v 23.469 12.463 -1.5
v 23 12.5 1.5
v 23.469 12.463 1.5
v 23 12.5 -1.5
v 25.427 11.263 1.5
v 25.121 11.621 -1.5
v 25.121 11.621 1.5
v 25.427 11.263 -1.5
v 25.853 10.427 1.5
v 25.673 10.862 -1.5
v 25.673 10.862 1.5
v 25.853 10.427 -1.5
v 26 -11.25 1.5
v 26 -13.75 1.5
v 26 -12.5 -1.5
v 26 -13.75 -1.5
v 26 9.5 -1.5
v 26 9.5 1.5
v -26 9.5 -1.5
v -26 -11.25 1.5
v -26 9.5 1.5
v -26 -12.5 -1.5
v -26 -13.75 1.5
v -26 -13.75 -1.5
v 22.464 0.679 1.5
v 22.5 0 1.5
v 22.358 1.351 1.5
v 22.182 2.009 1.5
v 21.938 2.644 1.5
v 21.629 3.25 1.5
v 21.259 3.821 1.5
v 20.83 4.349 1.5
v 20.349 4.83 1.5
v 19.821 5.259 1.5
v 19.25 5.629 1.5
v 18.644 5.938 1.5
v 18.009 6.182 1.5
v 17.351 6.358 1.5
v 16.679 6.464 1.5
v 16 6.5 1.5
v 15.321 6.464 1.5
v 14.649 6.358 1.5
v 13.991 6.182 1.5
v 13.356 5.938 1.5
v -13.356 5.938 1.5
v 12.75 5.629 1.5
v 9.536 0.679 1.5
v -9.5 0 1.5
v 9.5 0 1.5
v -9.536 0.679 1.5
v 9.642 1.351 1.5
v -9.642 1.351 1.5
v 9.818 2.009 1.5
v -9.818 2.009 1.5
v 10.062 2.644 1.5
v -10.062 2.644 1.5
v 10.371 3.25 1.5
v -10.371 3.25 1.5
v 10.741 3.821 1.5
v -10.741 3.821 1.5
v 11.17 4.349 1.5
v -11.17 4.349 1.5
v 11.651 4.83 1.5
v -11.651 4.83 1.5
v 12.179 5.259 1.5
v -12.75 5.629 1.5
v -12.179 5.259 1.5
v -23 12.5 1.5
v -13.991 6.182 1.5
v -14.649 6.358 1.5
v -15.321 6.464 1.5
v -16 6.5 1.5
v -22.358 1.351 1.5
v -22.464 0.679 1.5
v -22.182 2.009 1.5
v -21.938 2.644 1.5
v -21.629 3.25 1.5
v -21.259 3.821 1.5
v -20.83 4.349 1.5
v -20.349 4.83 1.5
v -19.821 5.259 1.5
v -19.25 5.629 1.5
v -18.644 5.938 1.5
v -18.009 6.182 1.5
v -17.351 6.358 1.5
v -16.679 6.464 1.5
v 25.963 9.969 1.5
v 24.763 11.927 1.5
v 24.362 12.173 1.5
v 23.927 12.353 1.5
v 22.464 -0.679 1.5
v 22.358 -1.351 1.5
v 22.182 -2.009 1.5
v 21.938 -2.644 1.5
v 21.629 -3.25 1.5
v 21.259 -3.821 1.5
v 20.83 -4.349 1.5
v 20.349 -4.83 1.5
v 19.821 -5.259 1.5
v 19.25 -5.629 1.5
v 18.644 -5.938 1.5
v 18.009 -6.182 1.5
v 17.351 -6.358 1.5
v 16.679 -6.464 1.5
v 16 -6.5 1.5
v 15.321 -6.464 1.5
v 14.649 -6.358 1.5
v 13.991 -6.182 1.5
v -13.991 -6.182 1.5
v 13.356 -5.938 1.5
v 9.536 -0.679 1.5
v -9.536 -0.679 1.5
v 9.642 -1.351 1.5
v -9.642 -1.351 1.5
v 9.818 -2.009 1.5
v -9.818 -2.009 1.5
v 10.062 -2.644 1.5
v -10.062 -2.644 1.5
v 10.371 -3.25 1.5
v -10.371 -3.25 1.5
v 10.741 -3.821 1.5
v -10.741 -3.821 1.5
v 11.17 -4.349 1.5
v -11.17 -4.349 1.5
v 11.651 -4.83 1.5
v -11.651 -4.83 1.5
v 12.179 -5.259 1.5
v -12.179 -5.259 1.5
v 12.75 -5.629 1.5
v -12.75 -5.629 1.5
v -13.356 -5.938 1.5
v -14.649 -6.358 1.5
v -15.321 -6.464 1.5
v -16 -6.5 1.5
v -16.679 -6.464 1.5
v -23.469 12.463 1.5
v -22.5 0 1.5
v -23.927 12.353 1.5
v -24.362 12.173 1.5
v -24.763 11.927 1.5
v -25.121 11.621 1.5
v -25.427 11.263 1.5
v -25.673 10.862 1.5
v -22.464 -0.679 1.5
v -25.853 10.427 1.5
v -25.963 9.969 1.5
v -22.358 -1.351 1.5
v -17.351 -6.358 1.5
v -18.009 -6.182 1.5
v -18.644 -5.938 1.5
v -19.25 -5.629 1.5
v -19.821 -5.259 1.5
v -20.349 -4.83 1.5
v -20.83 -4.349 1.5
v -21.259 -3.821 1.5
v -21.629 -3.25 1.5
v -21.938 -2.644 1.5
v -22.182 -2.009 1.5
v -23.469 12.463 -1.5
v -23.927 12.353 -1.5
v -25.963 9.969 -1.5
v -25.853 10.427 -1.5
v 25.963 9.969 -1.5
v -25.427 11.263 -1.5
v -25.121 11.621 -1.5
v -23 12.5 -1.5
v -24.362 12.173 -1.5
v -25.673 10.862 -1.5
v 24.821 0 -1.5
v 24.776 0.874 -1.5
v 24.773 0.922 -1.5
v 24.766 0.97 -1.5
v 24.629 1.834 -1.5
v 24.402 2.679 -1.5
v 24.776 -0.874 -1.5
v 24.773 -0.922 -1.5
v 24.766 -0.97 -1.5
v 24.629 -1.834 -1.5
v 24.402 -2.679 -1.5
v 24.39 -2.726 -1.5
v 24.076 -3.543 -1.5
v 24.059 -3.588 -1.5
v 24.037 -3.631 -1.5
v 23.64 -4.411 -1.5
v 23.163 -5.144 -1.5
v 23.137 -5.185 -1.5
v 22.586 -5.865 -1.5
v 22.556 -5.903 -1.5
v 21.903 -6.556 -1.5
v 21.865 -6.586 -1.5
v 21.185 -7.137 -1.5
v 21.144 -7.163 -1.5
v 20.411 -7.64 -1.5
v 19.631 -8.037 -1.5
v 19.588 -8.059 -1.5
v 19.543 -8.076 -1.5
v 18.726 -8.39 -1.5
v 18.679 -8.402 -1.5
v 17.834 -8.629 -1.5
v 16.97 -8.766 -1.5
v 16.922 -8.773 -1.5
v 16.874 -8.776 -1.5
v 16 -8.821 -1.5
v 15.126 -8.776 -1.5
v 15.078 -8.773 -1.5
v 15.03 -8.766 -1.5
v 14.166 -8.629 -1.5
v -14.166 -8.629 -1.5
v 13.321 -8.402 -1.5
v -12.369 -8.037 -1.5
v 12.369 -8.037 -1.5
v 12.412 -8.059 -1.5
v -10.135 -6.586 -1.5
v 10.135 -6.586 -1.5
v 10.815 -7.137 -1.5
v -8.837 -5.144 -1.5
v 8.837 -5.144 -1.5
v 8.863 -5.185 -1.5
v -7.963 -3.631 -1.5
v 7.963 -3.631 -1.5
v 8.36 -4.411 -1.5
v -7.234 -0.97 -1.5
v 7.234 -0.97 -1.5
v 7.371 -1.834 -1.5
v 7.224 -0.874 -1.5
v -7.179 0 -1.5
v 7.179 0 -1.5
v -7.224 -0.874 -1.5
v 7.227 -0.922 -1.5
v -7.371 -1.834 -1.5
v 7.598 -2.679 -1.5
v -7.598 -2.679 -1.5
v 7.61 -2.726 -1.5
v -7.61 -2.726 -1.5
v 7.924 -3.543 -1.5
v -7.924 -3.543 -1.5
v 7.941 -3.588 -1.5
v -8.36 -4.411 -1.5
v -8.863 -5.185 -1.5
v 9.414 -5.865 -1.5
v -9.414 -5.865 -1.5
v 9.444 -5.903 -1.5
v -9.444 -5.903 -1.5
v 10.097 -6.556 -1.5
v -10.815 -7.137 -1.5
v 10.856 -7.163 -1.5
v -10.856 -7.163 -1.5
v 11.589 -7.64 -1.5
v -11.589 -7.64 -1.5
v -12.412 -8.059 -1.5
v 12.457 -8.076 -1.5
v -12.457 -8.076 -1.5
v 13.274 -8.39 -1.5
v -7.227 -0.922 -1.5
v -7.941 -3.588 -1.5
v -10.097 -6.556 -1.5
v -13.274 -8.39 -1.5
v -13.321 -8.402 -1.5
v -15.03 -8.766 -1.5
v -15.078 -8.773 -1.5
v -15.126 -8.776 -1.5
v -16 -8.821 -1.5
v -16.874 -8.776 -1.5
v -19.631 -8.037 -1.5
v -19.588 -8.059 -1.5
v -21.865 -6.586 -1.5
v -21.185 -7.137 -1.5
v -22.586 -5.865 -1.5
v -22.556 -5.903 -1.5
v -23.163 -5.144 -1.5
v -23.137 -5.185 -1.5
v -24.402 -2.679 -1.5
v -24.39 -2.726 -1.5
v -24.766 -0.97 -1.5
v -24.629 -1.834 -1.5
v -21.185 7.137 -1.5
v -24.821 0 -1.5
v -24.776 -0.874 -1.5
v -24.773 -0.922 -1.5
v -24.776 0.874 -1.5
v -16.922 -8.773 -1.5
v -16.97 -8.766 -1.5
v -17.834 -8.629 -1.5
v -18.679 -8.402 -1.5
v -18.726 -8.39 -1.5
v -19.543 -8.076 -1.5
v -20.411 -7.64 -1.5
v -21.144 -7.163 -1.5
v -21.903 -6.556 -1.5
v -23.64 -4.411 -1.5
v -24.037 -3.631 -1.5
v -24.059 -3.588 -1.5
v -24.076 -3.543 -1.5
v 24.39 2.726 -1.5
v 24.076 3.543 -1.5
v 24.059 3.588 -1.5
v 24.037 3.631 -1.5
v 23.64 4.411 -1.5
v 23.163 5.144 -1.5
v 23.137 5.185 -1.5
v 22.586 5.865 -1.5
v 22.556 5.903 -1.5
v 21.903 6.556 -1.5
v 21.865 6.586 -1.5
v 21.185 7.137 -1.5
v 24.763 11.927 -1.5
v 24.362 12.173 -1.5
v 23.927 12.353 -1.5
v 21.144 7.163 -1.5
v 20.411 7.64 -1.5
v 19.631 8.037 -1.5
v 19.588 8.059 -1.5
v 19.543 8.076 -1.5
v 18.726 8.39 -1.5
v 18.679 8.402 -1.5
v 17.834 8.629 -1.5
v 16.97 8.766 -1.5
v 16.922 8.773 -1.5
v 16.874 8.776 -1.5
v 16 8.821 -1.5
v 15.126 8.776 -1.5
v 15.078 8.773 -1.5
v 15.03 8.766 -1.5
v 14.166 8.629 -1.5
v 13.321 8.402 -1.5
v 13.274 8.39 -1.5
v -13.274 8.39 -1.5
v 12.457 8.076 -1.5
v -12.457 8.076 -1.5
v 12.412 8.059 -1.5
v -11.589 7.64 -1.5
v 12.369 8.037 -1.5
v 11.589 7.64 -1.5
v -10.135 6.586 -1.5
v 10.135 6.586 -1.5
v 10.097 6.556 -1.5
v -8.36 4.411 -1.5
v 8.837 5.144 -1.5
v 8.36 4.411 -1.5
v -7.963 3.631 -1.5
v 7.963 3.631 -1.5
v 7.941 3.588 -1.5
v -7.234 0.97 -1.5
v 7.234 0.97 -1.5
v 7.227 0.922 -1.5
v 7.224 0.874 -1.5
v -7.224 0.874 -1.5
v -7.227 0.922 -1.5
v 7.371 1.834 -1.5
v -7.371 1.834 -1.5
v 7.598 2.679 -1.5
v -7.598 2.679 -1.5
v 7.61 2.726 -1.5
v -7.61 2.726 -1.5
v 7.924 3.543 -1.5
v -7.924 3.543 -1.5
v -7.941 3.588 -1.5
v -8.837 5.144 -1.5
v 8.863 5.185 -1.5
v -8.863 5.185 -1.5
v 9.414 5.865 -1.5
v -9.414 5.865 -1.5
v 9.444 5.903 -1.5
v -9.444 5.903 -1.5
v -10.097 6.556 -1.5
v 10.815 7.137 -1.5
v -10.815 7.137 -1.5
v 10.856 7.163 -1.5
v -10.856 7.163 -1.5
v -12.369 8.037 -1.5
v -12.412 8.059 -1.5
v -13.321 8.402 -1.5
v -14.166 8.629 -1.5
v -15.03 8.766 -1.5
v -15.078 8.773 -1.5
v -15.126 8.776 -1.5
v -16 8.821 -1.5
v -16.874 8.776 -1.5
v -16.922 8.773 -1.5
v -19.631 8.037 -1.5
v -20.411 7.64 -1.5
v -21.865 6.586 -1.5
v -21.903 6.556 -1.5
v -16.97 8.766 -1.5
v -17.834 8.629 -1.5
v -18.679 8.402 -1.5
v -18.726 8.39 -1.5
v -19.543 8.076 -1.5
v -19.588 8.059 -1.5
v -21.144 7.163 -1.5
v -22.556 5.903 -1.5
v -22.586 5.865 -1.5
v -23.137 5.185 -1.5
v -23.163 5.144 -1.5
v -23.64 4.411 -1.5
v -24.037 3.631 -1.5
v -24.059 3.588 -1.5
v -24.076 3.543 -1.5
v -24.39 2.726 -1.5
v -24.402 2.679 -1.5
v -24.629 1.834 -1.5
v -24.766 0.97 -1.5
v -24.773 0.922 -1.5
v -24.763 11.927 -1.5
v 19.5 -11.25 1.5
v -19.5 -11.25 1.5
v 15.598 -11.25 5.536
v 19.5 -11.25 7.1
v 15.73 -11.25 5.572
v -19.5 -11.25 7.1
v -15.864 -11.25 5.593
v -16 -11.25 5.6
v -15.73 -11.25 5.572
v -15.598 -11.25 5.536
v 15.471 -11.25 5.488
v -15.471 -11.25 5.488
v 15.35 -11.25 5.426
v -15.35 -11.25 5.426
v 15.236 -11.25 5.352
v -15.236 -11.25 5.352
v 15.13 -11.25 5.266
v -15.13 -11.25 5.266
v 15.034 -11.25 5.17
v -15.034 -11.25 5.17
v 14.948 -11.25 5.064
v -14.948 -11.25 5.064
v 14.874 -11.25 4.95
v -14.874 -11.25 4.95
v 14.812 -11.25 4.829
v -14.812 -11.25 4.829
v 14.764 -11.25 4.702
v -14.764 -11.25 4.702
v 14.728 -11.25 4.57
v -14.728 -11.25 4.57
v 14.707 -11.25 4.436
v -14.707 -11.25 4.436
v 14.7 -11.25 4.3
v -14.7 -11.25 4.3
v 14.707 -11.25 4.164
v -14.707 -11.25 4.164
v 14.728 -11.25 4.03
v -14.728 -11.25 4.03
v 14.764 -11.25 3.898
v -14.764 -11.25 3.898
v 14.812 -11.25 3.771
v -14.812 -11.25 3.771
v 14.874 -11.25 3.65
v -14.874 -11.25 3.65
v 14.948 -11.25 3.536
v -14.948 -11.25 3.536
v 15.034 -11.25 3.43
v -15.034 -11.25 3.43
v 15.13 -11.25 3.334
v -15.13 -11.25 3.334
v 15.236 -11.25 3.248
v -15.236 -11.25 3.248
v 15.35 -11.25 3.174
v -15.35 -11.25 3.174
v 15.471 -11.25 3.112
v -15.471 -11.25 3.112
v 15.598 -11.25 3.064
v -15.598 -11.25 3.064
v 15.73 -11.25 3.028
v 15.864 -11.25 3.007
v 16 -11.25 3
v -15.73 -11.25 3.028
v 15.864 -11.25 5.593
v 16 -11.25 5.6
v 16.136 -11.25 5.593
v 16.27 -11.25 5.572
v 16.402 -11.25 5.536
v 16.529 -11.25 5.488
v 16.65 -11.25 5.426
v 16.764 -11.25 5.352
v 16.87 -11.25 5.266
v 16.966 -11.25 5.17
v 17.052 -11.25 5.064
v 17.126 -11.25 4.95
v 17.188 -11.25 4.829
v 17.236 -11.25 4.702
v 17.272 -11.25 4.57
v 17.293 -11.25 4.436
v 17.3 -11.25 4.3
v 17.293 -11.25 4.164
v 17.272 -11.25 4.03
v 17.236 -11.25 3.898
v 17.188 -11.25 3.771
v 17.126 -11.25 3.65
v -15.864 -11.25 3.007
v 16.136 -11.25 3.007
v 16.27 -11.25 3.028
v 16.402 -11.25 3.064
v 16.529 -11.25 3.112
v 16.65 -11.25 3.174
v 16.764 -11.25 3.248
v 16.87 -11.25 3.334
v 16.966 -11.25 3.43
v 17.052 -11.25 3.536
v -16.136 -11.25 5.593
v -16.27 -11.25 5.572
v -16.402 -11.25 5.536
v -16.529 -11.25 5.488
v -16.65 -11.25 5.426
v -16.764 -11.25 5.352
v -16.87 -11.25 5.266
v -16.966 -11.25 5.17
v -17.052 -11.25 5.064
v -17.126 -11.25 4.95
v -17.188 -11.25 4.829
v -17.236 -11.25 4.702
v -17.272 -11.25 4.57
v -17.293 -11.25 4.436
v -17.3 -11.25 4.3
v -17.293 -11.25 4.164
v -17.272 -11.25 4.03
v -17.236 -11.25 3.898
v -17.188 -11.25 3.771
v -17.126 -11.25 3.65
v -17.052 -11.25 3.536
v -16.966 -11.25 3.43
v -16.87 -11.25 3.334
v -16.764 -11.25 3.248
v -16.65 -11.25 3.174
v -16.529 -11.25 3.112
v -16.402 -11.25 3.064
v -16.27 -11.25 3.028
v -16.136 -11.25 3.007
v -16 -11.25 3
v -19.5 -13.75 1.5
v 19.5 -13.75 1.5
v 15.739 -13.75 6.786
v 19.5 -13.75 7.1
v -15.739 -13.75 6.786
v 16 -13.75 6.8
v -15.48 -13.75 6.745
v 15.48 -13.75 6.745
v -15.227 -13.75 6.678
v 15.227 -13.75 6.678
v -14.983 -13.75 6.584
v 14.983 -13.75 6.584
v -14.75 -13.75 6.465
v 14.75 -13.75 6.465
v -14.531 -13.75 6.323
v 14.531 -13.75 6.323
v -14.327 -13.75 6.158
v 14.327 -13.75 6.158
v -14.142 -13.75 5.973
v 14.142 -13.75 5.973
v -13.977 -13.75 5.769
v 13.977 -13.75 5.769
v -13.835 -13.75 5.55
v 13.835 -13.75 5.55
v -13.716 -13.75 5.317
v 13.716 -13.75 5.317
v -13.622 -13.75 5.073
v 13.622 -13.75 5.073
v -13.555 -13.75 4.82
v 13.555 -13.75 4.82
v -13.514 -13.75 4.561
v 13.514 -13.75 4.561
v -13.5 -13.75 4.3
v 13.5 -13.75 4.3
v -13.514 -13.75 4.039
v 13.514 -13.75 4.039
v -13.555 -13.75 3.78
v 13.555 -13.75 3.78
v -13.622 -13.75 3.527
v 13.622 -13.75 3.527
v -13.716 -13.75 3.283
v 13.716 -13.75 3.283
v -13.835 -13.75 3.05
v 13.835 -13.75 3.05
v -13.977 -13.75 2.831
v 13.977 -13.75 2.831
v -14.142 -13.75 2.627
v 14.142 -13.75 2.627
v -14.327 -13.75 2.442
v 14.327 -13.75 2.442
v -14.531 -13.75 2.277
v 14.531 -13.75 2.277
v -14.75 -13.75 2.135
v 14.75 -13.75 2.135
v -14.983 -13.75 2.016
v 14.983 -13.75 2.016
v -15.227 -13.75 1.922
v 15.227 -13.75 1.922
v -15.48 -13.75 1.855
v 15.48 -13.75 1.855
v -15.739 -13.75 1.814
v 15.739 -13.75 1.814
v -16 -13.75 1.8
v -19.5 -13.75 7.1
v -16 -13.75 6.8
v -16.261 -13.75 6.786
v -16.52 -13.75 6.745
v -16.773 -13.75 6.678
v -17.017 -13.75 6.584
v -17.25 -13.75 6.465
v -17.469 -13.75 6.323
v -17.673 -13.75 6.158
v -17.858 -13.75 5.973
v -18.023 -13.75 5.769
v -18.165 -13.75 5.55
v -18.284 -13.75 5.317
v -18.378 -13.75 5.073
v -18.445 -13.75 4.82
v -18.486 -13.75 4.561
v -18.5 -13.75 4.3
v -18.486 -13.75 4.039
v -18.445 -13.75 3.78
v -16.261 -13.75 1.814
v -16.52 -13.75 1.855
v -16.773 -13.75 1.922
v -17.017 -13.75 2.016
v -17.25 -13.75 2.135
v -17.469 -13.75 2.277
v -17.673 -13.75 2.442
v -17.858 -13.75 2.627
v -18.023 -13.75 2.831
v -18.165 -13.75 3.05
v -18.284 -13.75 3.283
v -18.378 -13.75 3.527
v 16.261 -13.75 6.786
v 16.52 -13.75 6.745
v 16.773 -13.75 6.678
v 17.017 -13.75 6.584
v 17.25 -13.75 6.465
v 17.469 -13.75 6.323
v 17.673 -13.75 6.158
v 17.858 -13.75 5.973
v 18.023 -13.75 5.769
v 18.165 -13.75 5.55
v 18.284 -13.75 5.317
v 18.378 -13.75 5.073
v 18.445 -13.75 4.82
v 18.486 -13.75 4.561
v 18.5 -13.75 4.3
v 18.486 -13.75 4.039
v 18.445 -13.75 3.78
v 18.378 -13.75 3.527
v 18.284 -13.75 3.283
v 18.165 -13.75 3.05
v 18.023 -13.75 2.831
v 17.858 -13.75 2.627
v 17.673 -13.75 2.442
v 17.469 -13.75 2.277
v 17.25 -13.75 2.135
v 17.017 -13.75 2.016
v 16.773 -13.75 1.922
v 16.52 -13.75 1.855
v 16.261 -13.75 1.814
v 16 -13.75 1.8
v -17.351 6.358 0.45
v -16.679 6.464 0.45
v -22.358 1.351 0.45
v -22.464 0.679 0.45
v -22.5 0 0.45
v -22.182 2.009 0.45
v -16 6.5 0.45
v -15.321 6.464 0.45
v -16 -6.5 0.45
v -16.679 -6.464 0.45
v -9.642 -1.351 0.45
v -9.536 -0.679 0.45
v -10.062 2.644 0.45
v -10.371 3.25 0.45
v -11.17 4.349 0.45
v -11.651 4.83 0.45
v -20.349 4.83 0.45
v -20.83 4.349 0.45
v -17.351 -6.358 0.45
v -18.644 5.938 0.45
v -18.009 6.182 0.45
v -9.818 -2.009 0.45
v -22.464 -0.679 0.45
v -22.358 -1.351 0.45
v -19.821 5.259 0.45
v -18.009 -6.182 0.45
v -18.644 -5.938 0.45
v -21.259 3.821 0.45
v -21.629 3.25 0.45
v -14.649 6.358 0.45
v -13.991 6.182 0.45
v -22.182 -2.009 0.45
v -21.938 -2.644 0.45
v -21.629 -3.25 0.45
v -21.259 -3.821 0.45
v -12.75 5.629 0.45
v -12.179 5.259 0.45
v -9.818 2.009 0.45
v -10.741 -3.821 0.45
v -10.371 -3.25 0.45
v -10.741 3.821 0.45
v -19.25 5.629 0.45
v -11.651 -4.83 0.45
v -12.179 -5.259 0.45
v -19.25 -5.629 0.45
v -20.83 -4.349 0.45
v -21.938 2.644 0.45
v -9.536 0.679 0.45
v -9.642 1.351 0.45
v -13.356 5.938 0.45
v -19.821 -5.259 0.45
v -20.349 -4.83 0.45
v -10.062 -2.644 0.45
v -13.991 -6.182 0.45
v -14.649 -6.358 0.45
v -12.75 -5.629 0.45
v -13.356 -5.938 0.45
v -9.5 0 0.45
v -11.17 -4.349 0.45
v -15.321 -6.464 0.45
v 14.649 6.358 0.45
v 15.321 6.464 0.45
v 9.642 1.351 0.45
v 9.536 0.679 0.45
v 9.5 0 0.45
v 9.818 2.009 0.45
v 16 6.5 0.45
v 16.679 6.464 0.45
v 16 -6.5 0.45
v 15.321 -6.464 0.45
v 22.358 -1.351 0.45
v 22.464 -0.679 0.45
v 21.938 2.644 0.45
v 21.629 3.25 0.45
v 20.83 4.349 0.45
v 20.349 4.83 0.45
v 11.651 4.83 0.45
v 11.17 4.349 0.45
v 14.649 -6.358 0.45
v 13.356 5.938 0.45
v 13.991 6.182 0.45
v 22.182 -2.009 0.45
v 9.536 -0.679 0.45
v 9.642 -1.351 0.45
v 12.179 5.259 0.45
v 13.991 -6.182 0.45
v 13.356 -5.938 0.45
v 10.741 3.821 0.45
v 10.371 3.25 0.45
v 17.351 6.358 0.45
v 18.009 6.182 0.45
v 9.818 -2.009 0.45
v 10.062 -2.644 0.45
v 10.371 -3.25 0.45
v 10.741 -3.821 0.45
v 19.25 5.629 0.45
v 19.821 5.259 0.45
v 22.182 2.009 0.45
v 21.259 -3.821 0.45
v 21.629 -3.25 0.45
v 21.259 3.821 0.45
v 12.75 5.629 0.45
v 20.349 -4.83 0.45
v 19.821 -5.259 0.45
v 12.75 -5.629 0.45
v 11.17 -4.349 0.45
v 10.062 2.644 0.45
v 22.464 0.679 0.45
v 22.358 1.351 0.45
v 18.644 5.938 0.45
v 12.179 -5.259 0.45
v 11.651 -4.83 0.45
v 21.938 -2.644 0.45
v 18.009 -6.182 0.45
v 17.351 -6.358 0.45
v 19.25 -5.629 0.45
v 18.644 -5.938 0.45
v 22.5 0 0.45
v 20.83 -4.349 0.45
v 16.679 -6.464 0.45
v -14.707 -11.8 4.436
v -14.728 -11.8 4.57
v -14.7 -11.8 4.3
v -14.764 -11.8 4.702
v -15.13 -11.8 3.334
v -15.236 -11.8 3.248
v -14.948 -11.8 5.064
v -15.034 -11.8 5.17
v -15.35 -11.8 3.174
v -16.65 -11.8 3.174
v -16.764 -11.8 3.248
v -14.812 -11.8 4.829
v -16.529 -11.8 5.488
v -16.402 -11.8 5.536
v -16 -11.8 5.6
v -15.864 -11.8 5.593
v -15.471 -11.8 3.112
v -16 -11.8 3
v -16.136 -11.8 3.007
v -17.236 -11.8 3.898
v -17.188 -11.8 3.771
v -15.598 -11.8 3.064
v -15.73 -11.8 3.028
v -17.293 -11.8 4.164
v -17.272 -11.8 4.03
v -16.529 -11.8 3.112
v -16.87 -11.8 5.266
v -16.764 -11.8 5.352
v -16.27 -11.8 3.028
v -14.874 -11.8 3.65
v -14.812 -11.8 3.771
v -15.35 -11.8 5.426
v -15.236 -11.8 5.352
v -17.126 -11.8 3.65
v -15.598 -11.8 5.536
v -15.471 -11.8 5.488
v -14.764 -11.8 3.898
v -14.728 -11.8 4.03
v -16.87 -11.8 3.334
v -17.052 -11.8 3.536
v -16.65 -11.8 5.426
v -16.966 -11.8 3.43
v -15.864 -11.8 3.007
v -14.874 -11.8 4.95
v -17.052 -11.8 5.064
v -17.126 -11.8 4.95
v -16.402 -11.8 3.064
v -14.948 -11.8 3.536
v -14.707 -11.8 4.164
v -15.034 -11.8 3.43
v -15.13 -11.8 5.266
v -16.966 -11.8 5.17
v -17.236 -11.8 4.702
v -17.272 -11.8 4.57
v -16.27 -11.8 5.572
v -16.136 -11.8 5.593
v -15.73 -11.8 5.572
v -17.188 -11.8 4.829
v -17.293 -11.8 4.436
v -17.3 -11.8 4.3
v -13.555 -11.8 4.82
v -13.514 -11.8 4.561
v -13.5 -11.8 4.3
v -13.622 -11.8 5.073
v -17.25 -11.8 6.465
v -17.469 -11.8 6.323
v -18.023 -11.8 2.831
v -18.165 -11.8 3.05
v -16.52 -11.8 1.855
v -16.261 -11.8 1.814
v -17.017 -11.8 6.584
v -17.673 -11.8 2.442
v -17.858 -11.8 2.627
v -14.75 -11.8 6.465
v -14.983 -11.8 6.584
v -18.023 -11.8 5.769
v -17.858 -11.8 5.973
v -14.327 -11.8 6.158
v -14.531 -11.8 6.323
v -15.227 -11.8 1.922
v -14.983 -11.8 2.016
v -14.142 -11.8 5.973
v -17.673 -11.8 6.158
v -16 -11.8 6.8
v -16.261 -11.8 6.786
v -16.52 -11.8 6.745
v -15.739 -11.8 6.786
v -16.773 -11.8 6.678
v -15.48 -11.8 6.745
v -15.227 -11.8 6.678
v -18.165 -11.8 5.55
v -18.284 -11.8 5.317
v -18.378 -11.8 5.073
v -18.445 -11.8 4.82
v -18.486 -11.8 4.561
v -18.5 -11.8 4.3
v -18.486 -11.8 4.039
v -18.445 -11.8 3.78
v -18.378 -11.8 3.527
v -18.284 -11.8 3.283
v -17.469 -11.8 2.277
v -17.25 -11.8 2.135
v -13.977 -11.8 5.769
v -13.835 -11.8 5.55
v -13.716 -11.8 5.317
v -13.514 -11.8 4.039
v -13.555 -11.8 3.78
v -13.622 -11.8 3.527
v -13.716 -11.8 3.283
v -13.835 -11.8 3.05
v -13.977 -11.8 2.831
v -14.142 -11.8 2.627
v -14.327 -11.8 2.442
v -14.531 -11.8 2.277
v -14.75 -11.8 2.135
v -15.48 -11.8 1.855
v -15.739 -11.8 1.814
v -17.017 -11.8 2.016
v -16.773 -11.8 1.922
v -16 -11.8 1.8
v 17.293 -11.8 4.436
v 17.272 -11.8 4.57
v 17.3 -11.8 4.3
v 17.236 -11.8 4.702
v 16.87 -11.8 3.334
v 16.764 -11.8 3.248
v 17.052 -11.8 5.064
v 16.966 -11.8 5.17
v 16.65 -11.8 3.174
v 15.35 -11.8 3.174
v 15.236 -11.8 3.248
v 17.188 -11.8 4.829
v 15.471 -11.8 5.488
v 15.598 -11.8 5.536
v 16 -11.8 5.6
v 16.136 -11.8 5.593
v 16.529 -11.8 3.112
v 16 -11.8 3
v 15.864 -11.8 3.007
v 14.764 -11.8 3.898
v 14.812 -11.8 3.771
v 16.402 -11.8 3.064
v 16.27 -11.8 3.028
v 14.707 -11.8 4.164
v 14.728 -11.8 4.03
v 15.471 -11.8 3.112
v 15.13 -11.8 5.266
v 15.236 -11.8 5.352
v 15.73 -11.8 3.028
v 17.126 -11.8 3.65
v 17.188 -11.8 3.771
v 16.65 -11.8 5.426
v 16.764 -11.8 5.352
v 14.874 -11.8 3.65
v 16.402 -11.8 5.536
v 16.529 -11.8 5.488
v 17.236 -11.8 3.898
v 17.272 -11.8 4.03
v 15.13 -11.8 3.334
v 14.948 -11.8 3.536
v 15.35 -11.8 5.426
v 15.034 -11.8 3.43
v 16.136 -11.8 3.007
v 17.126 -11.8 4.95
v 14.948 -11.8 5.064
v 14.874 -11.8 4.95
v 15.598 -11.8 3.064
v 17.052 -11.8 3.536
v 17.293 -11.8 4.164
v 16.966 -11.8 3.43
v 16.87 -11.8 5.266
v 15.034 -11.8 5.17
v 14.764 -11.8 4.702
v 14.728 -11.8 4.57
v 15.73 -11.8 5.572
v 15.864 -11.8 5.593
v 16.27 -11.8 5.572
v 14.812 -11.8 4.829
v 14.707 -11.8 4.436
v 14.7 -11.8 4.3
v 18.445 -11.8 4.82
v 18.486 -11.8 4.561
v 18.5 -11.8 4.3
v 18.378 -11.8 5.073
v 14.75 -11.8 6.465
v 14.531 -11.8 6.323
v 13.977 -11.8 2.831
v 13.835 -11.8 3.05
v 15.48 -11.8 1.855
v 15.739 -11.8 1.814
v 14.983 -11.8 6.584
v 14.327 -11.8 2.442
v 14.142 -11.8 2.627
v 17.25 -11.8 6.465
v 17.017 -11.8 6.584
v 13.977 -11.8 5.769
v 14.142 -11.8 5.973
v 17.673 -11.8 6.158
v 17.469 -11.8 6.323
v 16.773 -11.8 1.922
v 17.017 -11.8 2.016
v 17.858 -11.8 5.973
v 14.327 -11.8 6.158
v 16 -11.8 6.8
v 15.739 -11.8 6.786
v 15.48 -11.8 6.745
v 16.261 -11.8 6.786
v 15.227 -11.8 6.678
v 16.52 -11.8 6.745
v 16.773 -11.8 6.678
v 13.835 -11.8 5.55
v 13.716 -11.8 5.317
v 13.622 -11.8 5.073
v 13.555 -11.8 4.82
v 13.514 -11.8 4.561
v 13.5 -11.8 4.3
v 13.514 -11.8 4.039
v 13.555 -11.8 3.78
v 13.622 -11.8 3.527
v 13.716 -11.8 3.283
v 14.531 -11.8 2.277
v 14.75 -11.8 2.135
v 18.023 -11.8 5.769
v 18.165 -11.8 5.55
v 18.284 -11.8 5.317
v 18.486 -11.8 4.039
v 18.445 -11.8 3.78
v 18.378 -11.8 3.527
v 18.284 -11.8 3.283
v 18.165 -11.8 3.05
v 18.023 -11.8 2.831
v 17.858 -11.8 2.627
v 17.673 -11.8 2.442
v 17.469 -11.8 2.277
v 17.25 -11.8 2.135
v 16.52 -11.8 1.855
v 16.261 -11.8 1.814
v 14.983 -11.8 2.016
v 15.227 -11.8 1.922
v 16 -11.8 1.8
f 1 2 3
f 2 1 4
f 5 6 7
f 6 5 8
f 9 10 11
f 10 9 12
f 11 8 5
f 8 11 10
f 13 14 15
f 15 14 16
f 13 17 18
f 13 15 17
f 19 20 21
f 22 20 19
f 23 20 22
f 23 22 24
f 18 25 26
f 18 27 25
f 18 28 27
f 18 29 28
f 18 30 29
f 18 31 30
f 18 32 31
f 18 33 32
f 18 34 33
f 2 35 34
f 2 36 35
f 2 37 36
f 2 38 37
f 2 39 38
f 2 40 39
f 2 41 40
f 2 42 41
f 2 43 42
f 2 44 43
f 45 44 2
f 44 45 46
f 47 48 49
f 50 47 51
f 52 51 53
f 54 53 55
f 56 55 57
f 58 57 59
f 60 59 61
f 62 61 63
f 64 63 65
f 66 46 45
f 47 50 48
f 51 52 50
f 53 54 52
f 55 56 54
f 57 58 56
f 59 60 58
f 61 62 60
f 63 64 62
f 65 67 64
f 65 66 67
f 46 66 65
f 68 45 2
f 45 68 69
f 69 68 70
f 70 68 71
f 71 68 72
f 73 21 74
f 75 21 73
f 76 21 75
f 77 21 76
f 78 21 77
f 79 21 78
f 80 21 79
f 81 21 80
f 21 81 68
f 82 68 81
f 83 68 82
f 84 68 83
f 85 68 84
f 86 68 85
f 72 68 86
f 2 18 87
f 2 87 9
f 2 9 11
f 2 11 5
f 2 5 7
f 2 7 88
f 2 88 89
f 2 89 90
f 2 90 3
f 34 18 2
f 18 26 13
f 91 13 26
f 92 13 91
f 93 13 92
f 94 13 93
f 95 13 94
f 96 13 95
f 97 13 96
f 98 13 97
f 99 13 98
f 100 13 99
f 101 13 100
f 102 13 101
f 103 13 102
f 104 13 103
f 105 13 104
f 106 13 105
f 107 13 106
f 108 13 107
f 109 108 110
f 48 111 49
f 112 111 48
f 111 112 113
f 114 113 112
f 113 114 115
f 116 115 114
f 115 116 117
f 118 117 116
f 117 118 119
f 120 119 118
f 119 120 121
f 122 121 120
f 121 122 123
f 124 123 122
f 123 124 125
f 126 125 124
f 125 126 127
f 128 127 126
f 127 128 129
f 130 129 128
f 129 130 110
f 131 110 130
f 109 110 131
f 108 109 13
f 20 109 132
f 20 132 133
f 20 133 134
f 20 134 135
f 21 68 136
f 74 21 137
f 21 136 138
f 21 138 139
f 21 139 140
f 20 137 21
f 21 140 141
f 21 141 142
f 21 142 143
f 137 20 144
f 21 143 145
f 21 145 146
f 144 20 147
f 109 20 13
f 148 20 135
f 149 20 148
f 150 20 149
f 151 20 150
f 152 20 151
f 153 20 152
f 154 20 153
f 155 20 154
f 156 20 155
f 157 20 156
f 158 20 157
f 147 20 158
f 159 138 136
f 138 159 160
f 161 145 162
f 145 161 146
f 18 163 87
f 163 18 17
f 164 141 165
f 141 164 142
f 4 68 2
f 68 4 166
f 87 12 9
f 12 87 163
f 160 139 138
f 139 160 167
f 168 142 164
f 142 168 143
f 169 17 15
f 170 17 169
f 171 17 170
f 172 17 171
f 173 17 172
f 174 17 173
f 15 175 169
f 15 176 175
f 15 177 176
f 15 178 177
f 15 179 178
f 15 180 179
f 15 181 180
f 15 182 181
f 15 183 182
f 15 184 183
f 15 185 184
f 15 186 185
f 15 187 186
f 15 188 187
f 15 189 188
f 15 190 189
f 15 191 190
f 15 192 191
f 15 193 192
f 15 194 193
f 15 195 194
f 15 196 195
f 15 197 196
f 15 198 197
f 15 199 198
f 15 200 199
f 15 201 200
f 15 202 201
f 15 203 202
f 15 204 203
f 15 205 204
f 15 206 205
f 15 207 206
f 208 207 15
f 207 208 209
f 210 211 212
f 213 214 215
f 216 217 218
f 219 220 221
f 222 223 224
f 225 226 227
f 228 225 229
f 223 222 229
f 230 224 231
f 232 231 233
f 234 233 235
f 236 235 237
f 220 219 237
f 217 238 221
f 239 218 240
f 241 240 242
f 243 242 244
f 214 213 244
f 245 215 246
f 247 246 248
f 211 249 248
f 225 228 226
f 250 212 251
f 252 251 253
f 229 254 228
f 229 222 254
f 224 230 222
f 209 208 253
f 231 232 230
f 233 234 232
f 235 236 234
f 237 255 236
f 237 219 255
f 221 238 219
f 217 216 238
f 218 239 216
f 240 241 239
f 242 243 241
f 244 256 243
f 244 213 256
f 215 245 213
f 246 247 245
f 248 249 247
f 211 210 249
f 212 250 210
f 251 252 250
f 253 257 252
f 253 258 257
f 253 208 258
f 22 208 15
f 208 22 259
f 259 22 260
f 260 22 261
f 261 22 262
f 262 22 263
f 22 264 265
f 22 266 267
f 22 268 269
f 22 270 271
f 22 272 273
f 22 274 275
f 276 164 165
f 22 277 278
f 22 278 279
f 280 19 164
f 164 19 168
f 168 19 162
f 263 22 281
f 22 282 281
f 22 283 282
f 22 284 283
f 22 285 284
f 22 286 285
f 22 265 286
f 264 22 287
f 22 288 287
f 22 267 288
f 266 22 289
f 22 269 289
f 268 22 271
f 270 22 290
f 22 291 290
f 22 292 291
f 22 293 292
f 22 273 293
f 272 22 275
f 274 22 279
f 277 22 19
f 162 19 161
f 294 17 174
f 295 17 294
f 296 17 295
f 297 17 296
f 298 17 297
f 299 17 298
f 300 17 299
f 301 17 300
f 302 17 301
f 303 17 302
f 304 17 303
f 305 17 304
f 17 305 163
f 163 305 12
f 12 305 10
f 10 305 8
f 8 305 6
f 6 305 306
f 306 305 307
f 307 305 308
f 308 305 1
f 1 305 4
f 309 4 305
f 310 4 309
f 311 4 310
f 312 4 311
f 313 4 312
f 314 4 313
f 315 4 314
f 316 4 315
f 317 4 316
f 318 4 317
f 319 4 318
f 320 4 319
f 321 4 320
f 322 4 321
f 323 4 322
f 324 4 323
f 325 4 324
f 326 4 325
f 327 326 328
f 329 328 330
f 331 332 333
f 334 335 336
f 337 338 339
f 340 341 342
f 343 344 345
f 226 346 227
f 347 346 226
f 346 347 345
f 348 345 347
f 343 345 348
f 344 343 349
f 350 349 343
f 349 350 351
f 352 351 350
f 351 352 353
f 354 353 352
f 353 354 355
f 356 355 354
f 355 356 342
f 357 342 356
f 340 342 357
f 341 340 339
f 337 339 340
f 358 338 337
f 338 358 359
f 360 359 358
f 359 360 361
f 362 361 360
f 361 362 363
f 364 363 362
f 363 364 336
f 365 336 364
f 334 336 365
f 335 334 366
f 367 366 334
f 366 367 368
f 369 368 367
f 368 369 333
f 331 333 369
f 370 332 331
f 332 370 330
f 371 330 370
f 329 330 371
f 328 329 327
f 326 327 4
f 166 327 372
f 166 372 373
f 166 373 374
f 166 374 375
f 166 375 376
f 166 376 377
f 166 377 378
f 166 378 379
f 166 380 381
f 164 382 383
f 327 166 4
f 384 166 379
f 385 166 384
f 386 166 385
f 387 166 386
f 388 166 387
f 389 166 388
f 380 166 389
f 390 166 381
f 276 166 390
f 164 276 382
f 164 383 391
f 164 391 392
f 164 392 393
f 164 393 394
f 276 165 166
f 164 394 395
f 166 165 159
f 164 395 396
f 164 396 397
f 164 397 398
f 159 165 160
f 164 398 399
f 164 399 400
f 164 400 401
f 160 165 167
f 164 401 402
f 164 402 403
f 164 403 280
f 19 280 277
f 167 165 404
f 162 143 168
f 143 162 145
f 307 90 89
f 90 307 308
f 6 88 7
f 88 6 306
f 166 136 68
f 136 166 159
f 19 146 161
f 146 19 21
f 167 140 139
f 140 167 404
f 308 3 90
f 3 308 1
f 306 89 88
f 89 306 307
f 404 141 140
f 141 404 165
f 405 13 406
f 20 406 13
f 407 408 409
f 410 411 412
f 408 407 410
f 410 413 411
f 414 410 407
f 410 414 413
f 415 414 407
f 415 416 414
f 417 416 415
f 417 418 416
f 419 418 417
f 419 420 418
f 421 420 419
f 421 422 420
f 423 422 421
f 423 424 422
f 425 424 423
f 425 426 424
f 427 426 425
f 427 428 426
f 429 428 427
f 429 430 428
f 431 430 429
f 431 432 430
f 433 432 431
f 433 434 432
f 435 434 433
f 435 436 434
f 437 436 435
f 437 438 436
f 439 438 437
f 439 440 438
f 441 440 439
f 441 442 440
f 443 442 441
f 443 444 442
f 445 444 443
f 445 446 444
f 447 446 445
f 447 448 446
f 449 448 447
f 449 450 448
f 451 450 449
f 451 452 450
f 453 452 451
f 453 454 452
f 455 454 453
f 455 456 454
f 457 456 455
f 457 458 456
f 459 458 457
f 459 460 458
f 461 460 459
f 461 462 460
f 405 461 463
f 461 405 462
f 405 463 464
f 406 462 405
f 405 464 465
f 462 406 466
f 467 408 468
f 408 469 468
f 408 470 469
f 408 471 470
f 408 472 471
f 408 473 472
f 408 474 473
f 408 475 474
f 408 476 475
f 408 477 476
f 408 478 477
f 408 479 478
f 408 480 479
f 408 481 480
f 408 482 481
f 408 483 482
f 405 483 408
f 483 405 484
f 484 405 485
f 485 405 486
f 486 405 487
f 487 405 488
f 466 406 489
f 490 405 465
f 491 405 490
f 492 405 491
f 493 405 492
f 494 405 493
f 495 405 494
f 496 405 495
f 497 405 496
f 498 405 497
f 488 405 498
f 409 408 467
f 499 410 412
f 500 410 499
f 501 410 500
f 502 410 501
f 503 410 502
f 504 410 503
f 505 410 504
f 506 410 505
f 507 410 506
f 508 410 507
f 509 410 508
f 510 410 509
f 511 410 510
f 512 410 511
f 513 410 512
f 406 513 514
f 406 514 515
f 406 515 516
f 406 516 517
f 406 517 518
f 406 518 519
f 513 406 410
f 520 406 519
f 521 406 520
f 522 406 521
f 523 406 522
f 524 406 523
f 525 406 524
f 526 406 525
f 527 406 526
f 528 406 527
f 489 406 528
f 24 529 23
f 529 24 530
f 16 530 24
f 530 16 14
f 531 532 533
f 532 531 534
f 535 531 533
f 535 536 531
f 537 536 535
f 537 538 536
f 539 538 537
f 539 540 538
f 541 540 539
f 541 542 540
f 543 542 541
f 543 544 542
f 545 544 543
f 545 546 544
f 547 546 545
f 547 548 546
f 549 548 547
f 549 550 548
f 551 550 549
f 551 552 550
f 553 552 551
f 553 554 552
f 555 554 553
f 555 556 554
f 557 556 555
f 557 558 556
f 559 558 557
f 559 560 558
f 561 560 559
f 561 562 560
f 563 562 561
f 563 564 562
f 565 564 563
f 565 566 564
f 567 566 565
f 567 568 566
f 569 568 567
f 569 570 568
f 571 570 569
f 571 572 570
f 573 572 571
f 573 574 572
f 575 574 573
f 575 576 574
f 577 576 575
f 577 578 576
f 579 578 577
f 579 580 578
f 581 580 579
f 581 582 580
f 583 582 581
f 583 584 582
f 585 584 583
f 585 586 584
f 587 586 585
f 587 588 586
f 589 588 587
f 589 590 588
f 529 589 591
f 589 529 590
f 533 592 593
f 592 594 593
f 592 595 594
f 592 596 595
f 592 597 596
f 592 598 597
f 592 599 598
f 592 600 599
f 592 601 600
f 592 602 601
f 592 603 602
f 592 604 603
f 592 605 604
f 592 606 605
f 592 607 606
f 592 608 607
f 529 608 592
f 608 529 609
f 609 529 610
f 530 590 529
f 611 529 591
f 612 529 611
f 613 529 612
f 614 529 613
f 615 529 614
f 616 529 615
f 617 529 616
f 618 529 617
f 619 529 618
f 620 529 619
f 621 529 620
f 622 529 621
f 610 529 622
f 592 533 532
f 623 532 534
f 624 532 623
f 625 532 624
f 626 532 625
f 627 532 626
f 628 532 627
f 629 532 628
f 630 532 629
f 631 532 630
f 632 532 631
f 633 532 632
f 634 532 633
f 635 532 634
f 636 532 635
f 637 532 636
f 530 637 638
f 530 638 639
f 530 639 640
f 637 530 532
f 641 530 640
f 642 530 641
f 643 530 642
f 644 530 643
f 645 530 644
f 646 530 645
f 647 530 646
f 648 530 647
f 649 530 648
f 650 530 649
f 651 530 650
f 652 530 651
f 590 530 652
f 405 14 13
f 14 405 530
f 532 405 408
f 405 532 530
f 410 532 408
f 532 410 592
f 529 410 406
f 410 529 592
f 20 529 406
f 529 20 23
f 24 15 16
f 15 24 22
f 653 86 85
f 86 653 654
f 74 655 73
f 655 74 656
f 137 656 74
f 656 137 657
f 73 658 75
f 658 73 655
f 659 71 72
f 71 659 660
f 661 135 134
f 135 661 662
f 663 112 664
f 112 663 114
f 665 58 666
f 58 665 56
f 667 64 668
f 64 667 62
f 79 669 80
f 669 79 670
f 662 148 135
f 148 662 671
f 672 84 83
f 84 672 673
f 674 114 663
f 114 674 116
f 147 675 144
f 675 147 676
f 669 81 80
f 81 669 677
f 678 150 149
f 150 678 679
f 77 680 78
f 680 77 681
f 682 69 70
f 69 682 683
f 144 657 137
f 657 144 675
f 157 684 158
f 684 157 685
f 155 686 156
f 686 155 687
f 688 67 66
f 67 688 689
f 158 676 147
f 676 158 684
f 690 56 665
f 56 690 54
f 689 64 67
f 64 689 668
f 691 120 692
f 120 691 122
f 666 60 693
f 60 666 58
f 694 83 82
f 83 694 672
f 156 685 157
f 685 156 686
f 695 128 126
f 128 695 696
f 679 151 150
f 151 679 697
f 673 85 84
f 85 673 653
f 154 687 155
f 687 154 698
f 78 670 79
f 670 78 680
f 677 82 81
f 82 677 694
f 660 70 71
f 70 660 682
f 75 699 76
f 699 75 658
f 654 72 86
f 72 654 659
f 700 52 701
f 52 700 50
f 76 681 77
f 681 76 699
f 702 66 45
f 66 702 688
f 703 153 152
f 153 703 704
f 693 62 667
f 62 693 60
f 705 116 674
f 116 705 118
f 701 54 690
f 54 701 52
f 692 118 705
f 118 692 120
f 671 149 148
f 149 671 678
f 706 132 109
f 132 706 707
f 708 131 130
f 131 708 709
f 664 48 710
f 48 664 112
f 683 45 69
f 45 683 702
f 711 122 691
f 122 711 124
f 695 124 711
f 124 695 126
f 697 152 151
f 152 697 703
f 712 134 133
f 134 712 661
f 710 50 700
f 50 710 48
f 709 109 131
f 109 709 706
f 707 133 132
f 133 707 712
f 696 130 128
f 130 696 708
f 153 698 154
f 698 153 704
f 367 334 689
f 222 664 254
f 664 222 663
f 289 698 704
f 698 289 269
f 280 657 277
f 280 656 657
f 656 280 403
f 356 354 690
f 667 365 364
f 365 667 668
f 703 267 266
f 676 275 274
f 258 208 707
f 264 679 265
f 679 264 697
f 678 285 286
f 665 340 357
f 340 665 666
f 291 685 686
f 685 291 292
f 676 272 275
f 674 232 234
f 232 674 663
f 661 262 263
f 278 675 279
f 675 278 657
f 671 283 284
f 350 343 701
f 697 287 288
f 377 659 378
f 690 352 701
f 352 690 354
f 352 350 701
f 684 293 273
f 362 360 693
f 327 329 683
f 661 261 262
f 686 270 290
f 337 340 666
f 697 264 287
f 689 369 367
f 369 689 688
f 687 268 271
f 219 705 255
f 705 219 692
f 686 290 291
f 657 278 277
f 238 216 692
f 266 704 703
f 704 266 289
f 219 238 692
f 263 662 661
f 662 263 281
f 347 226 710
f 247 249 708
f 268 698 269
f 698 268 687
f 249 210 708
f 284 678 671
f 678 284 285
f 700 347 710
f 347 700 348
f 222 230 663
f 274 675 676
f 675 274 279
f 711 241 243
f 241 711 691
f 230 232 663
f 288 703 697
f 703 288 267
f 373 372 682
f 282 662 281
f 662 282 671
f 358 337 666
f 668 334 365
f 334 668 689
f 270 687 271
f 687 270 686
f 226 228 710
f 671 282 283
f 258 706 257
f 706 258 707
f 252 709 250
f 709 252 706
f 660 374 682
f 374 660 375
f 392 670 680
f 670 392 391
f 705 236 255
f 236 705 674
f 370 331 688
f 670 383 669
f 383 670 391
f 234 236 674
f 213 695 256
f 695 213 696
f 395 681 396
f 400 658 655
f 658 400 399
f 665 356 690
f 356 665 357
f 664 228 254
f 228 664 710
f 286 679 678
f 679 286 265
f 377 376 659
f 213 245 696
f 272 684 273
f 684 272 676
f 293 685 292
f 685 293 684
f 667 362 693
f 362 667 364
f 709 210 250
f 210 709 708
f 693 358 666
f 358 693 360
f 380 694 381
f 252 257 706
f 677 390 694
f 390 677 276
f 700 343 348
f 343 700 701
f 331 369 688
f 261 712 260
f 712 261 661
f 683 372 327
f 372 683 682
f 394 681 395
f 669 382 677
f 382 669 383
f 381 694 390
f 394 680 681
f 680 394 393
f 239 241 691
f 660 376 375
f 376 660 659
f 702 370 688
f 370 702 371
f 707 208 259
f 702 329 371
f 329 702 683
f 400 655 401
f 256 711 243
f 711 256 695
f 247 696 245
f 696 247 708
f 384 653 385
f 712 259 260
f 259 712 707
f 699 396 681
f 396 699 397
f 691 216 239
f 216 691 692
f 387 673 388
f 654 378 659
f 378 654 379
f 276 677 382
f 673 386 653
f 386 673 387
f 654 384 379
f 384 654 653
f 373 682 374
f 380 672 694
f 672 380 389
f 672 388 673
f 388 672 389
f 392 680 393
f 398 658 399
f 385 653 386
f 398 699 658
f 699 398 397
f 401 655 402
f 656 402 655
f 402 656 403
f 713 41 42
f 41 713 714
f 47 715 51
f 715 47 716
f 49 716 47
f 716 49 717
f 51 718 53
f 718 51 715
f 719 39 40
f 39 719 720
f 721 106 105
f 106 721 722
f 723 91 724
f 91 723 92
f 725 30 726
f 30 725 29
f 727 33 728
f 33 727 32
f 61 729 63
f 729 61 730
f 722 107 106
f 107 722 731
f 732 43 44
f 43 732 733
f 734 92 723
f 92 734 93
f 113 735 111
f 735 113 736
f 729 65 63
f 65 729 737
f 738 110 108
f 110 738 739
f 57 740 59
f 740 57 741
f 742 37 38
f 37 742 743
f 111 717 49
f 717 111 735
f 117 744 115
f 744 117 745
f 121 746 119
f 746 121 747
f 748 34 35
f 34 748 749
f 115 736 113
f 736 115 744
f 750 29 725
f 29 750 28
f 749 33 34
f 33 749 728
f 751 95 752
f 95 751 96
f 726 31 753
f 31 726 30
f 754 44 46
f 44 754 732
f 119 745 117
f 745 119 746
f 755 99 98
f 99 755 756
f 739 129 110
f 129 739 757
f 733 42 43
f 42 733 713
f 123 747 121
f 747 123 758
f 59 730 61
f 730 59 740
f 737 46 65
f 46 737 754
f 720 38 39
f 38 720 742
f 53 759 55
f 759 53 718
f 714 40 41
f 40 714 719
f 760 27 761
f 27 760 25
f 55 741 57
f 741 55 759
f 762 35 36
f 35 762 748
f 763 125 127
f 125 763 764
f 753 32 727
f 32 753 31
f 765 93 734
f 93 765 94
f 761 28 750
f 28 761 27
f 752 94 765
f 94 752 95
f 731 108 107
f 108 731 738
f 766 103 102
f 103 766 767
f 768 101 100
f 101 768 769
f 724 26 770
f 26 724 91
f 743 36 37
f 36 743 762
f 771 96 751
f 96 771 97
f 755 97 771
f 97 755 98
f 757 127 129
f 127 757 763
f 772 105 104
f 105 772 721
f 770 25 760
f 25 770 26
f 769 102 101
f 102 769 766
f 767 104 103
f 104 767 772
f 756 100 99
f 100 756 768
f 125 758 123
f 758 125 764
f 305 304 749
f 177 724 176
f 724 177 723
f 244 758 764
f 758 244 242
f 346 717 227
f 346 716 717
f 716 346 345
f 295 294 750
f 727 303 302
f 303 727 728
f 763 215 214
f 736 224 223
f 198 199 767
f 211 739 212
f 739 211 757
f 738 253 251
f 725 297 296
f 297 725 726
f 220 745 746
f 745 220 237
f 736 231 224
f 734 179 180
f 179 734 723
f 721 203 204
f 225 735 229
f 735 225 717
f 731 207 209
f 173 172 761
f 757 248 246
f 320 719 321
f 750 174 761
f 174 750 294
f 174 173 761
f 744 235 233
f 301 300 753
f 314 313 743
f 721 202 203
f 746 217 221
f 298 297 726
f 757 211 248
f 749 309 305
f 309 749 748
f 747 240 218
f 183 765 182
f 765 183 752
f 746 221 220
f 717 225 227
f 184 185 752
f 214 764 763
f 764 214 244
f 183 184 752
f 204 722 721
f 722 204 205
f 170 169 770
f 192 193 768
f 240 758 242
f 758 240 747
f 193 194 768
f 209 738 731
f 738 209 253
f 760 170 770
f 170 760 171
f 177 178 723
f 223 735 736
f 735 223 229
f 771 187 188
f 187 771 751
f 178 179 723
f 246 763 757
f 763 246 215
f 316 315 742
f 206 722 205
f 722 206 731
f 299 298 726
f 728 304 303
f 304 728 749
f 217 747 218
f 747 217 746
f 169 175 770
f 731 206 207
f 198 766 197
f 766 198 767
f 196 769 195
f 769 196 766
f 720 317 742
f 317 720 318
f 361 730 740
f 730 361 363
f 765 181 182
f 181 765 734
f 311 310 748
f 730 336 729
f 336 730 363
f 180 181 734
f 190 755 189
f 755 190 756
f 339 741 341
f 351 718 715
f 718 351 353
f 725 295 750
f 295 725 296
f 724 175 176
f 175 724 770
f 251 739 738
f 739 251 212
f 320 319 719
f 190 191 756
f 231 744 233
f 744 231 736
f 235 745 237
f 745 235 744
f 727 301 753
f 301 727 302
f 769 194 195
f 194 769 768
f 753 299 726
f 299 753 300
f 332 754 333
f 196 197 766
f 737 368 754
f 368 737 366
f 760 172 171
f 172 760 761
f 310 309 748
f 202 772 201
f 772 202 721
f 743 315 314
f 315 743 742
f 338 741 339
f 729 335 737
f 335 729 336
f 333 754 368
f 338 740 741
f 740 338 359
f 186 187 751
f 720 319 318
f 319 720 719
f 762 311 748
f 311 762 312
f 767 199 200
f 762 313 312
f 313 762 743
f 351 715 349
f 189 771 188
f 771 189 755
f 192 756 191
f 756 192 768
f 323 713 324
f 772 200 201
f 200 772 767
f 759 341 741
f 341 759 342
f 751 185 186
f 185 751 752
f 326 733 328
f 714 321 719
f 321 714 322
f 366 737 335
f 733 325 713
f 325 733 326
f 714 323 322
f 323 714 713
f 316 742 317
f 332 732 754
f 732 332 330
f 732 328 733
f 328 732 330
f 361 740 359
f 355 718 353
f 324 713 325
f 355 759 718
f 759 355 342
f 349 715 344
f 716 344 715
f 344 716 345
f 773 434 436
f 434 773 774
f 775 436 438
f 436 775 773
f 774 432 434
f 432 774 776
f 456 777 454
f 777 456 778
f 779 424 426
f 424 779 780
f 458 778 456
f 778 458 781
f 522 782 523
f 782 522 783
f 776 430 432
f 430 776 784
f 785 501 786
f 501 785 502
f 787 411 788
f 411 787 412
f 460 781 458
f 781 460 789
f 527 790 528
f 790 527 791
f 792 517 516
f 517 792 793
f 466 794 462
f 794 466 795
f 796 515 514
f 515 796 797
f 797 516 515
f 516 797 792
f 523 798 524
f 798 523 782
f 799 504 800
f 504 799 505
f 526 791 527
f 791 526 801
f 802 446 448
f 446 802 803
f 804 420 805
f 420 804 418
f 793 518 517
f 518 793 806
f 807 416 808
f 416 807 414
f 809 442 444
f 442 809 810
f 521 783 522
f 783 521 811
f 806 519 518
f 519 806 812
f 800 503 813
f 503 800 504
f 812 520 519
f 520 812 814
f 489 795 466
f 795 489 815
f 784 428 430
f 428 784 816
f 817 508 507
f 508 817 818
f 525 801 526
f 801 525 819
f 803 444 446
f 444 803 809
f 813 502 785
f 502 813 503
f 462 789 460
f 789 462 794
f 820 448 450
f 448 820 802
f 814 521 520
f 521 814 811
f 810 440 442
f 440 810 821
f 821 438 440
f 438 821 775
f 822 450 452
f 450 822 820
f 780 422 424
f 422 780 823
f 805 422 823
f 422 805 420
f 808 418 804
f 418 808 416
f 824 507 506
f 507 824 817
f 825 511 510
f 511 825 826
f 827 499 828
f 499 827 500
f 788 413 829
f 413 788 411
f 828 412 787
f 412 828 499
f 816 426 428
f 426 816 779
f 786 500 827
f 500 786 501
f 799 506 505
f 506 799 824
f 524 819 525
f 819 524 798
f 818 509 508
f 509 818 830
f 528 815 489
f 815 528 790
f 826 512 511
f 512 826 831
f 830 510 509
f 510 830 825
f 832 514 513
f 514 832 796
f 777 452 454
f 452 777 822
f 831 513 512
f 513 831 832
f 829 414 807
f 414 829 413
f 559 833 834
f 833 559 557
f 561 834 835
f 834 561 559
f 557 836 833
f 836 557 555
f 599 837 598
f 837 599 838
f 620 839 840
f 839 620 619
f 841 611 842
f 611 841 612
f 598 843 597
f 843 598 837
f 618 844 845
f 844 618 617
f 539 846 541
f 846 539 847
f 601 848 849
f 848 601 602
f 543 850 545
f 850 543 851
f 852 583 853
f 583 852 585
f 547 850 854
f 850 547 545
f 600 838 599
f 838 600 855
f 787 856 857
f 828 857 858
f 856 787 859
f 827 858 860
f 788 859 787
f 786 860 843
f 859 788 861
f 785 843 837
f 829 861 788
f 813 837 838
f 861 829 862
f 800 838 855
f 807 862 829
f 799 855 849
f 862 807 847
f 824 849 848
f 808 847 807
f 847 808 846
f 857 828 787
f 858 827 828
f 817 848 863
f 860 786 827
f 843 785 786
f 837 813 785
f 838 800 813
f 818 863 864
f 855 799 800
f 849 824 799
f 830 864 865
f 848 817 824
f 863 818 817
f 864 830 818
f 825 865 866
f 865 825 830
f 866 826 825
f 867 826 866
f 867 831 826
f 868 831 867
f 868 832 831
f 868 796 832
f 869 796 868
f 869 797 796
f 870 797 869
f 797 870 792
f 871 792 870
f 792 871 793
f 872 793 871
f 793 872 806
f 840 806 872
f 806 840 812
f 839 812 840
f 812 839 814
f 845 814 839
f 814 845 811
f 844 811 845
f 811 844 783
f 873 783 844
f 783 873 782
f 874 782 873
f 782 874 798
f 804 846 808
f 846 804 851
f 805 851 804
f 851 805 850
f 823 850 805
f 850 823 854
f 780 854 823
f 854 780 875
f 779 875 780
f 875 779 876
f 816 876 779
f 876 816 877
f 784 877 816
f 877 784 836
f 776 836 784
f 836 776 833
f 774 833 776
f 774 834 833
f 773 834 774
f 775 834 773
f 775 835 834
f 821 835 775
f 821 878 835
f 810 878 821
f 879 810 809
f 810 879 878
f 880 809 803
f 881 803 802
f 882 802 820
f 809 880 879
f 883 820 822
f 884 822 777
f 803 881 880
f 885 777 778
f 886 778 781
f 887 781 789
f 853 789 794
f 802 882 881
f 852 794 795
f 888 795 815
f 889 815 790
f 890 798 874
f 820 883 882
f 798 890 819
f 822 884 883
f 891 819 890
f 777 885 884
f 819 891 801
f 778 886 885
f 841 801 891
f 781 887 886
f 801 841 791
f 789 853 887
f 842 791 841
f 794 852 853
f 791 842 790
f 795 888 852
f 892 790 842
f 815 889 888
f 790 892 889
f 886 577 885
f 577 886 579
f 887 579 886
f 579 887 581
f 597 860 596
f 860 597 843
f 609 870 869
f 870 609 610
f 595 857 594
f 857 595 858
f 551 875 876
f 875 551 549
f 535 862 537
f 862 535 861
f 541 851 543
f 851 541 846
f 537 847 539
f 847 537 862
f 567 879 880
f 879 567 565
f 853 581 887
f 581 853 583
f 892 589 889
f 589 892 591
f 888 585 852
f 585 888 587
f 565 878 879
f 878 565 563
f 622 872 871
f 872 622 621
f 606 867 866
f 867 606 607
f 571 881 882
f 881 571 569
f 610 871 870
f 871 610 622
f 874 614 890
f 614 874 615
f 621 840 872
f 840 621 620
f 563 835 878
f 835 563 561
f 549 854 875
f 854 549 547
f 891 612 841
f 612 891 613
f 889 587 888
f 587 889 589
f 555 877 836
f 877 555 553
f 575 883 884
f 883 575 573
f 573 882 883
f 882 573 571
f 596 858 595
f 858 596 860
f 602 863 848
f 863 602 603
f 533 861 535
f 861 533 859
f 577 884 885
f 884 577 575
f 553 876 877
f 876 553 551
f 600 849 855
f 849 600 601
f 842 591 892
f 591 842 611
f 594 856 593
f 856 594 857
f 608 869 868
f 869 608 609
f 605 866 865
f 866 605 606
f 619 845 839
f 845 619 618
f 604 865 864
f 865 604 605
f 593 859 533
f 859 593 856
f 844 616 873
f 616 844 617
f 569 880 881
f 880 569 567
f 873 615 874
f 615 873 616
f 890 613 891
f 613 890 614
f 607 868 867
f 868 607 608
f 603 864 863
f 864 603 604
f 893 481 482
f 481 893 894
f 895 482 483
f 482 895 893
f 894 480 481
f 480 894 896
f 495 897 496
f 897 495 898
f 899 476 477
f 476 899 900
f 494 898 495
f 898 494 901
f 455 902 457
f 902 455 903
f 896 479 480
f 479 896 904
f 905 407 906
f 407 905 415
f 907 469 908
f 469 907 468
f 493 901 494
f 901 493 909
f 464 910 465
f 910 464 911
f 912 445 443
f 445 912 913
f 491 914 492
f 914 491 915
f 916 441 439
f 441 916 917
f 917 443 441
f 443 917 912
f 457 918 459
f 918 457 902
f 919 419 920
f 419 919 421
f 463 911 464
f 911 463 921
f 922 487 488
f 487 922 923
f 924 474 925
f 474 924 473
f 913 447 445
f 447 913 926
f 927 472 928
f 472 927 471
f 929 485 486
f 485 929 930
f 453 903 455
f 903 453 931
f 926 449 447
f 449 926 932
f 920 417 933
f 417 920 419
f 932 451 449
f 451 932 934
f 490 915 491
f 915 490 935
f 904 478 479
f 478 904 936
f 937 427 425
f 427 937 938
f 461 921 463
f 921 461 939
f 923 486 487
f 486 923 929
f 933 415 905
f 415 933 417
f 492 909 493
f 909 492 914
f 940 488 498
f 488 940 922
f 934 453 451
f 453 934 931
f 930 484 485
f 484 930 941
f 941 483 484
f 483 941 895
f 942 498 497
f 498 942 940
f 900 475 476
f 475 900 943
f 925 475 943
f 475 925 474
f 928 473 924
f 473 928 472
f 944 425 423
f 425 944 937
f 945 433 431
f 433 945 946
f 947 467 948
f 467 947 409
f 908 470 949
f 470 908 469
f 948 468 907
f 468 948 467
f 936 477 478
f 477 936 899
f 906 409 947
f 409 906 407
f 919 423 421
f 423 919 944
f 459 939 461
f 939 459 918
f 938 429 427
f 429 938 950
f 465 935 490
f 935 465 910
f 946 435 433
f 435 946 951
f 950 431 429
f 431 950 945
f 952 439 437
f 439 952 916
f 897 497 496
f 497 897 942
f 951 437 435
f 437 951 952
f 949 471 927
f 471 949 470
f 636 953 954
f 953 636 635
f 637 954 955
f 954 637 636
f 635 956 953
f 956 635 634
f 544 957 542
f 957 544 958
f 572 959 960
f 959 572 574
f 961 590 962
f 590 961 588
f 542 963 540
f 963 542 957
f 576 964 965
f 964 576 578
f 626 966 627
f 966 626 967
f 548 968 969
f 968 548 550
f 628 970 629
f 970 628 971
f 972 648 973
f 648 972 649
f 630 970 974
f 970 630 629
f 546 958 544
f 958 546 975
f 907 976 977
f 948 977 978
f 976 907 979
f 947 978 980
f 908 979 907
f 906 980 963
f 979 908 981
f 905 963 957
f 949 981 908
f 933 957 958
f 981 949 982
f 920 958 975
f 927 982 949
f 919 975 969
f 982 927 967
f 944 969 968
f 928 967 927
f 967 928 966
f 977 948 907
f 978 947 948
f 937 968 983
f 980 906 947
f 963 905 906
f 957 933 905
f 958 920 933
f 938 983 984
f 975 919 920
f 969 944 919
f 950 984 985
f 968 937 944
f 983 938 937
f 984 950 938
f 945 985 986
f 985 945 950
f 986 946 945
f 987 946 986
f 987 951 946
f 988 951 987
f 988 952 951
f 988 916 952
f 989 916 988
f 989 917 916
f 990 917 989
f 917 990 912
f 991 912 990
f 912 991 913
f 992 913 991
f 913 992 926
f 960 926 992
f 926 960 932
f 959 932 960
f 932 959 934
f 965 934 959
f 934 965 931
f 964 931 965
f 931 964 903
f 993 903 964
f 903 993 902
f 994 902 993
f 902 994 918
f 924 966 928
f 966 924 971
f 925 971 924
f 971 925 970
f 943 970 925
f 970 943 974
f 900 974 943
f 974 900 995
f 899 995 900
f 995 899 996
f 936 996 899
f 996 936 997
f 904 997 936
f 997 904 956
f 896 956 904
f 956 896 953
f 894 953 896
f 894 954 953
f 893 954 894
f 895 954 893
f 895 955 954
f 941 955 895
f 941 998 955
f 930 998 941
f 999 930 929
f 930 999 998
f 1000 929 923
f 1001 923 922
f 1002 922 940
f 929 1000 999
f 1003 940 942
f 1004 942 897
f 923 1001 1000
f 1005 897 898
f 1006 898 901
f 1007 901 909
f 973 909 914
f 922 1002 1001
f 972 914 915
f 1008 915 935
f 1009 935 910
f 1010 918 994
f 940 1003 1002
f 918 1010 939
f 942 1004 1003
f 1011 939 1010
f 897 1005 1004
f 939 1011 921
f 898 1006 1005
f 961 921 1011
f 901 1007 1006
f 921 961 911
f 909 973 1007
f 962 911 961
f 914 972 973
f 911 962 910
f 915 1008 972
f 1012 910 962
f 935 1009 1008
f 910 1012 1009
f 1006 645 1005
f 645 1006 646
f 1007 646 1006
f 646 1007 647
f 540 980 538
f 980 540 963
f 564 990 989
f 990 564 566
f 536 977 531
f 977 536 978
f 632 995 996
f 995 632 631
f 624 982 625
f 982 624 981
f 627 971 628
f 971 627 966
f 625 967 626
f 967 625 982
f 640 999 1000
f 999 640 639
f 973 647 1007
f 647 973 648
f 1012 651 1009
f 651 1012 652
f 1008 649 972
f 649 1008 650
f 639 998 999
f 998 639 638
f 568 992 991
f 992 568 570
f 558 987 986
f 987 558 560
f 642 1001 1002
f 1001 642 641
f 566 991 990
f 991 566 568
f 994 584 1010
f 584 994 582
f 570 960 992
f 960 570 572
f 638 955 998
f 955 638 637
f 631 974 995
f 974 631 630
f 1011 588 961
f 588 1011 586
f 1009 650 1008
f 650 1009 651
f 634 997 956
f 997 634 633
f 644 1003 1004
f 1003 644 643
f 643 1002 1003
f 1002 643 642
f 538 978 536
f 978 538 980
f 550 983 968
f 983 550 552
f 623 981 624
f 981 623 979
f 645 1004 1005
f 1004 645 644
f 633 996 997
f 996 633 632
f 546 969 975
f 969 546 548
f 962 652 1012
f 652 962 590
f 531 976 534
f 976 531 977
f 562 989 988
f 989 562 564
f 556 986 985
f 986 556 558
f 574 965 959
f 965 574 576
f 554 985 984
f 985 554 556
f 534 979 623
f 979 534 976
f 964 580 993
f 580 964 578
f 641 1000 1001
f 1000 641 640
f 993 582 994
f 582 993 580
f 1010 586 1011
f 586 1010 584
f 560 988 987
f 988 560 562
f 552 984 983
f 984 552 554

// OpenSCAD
/**
 * Module: A printable plate with two 12-mm mounting holes for two switch buttons
 *
 * Author: Karim Aziiev <karim.aziiev@gmail.com>
 * License: GPL-3.0-or-later
 */
use <../simple_robot/chassis/rear_panel/rear_panel.scad>

module rear_panel_printable(colr="white") {
  rear_panel(show_switch_button=false, colr=colr);
}

rear_panel_printable();
